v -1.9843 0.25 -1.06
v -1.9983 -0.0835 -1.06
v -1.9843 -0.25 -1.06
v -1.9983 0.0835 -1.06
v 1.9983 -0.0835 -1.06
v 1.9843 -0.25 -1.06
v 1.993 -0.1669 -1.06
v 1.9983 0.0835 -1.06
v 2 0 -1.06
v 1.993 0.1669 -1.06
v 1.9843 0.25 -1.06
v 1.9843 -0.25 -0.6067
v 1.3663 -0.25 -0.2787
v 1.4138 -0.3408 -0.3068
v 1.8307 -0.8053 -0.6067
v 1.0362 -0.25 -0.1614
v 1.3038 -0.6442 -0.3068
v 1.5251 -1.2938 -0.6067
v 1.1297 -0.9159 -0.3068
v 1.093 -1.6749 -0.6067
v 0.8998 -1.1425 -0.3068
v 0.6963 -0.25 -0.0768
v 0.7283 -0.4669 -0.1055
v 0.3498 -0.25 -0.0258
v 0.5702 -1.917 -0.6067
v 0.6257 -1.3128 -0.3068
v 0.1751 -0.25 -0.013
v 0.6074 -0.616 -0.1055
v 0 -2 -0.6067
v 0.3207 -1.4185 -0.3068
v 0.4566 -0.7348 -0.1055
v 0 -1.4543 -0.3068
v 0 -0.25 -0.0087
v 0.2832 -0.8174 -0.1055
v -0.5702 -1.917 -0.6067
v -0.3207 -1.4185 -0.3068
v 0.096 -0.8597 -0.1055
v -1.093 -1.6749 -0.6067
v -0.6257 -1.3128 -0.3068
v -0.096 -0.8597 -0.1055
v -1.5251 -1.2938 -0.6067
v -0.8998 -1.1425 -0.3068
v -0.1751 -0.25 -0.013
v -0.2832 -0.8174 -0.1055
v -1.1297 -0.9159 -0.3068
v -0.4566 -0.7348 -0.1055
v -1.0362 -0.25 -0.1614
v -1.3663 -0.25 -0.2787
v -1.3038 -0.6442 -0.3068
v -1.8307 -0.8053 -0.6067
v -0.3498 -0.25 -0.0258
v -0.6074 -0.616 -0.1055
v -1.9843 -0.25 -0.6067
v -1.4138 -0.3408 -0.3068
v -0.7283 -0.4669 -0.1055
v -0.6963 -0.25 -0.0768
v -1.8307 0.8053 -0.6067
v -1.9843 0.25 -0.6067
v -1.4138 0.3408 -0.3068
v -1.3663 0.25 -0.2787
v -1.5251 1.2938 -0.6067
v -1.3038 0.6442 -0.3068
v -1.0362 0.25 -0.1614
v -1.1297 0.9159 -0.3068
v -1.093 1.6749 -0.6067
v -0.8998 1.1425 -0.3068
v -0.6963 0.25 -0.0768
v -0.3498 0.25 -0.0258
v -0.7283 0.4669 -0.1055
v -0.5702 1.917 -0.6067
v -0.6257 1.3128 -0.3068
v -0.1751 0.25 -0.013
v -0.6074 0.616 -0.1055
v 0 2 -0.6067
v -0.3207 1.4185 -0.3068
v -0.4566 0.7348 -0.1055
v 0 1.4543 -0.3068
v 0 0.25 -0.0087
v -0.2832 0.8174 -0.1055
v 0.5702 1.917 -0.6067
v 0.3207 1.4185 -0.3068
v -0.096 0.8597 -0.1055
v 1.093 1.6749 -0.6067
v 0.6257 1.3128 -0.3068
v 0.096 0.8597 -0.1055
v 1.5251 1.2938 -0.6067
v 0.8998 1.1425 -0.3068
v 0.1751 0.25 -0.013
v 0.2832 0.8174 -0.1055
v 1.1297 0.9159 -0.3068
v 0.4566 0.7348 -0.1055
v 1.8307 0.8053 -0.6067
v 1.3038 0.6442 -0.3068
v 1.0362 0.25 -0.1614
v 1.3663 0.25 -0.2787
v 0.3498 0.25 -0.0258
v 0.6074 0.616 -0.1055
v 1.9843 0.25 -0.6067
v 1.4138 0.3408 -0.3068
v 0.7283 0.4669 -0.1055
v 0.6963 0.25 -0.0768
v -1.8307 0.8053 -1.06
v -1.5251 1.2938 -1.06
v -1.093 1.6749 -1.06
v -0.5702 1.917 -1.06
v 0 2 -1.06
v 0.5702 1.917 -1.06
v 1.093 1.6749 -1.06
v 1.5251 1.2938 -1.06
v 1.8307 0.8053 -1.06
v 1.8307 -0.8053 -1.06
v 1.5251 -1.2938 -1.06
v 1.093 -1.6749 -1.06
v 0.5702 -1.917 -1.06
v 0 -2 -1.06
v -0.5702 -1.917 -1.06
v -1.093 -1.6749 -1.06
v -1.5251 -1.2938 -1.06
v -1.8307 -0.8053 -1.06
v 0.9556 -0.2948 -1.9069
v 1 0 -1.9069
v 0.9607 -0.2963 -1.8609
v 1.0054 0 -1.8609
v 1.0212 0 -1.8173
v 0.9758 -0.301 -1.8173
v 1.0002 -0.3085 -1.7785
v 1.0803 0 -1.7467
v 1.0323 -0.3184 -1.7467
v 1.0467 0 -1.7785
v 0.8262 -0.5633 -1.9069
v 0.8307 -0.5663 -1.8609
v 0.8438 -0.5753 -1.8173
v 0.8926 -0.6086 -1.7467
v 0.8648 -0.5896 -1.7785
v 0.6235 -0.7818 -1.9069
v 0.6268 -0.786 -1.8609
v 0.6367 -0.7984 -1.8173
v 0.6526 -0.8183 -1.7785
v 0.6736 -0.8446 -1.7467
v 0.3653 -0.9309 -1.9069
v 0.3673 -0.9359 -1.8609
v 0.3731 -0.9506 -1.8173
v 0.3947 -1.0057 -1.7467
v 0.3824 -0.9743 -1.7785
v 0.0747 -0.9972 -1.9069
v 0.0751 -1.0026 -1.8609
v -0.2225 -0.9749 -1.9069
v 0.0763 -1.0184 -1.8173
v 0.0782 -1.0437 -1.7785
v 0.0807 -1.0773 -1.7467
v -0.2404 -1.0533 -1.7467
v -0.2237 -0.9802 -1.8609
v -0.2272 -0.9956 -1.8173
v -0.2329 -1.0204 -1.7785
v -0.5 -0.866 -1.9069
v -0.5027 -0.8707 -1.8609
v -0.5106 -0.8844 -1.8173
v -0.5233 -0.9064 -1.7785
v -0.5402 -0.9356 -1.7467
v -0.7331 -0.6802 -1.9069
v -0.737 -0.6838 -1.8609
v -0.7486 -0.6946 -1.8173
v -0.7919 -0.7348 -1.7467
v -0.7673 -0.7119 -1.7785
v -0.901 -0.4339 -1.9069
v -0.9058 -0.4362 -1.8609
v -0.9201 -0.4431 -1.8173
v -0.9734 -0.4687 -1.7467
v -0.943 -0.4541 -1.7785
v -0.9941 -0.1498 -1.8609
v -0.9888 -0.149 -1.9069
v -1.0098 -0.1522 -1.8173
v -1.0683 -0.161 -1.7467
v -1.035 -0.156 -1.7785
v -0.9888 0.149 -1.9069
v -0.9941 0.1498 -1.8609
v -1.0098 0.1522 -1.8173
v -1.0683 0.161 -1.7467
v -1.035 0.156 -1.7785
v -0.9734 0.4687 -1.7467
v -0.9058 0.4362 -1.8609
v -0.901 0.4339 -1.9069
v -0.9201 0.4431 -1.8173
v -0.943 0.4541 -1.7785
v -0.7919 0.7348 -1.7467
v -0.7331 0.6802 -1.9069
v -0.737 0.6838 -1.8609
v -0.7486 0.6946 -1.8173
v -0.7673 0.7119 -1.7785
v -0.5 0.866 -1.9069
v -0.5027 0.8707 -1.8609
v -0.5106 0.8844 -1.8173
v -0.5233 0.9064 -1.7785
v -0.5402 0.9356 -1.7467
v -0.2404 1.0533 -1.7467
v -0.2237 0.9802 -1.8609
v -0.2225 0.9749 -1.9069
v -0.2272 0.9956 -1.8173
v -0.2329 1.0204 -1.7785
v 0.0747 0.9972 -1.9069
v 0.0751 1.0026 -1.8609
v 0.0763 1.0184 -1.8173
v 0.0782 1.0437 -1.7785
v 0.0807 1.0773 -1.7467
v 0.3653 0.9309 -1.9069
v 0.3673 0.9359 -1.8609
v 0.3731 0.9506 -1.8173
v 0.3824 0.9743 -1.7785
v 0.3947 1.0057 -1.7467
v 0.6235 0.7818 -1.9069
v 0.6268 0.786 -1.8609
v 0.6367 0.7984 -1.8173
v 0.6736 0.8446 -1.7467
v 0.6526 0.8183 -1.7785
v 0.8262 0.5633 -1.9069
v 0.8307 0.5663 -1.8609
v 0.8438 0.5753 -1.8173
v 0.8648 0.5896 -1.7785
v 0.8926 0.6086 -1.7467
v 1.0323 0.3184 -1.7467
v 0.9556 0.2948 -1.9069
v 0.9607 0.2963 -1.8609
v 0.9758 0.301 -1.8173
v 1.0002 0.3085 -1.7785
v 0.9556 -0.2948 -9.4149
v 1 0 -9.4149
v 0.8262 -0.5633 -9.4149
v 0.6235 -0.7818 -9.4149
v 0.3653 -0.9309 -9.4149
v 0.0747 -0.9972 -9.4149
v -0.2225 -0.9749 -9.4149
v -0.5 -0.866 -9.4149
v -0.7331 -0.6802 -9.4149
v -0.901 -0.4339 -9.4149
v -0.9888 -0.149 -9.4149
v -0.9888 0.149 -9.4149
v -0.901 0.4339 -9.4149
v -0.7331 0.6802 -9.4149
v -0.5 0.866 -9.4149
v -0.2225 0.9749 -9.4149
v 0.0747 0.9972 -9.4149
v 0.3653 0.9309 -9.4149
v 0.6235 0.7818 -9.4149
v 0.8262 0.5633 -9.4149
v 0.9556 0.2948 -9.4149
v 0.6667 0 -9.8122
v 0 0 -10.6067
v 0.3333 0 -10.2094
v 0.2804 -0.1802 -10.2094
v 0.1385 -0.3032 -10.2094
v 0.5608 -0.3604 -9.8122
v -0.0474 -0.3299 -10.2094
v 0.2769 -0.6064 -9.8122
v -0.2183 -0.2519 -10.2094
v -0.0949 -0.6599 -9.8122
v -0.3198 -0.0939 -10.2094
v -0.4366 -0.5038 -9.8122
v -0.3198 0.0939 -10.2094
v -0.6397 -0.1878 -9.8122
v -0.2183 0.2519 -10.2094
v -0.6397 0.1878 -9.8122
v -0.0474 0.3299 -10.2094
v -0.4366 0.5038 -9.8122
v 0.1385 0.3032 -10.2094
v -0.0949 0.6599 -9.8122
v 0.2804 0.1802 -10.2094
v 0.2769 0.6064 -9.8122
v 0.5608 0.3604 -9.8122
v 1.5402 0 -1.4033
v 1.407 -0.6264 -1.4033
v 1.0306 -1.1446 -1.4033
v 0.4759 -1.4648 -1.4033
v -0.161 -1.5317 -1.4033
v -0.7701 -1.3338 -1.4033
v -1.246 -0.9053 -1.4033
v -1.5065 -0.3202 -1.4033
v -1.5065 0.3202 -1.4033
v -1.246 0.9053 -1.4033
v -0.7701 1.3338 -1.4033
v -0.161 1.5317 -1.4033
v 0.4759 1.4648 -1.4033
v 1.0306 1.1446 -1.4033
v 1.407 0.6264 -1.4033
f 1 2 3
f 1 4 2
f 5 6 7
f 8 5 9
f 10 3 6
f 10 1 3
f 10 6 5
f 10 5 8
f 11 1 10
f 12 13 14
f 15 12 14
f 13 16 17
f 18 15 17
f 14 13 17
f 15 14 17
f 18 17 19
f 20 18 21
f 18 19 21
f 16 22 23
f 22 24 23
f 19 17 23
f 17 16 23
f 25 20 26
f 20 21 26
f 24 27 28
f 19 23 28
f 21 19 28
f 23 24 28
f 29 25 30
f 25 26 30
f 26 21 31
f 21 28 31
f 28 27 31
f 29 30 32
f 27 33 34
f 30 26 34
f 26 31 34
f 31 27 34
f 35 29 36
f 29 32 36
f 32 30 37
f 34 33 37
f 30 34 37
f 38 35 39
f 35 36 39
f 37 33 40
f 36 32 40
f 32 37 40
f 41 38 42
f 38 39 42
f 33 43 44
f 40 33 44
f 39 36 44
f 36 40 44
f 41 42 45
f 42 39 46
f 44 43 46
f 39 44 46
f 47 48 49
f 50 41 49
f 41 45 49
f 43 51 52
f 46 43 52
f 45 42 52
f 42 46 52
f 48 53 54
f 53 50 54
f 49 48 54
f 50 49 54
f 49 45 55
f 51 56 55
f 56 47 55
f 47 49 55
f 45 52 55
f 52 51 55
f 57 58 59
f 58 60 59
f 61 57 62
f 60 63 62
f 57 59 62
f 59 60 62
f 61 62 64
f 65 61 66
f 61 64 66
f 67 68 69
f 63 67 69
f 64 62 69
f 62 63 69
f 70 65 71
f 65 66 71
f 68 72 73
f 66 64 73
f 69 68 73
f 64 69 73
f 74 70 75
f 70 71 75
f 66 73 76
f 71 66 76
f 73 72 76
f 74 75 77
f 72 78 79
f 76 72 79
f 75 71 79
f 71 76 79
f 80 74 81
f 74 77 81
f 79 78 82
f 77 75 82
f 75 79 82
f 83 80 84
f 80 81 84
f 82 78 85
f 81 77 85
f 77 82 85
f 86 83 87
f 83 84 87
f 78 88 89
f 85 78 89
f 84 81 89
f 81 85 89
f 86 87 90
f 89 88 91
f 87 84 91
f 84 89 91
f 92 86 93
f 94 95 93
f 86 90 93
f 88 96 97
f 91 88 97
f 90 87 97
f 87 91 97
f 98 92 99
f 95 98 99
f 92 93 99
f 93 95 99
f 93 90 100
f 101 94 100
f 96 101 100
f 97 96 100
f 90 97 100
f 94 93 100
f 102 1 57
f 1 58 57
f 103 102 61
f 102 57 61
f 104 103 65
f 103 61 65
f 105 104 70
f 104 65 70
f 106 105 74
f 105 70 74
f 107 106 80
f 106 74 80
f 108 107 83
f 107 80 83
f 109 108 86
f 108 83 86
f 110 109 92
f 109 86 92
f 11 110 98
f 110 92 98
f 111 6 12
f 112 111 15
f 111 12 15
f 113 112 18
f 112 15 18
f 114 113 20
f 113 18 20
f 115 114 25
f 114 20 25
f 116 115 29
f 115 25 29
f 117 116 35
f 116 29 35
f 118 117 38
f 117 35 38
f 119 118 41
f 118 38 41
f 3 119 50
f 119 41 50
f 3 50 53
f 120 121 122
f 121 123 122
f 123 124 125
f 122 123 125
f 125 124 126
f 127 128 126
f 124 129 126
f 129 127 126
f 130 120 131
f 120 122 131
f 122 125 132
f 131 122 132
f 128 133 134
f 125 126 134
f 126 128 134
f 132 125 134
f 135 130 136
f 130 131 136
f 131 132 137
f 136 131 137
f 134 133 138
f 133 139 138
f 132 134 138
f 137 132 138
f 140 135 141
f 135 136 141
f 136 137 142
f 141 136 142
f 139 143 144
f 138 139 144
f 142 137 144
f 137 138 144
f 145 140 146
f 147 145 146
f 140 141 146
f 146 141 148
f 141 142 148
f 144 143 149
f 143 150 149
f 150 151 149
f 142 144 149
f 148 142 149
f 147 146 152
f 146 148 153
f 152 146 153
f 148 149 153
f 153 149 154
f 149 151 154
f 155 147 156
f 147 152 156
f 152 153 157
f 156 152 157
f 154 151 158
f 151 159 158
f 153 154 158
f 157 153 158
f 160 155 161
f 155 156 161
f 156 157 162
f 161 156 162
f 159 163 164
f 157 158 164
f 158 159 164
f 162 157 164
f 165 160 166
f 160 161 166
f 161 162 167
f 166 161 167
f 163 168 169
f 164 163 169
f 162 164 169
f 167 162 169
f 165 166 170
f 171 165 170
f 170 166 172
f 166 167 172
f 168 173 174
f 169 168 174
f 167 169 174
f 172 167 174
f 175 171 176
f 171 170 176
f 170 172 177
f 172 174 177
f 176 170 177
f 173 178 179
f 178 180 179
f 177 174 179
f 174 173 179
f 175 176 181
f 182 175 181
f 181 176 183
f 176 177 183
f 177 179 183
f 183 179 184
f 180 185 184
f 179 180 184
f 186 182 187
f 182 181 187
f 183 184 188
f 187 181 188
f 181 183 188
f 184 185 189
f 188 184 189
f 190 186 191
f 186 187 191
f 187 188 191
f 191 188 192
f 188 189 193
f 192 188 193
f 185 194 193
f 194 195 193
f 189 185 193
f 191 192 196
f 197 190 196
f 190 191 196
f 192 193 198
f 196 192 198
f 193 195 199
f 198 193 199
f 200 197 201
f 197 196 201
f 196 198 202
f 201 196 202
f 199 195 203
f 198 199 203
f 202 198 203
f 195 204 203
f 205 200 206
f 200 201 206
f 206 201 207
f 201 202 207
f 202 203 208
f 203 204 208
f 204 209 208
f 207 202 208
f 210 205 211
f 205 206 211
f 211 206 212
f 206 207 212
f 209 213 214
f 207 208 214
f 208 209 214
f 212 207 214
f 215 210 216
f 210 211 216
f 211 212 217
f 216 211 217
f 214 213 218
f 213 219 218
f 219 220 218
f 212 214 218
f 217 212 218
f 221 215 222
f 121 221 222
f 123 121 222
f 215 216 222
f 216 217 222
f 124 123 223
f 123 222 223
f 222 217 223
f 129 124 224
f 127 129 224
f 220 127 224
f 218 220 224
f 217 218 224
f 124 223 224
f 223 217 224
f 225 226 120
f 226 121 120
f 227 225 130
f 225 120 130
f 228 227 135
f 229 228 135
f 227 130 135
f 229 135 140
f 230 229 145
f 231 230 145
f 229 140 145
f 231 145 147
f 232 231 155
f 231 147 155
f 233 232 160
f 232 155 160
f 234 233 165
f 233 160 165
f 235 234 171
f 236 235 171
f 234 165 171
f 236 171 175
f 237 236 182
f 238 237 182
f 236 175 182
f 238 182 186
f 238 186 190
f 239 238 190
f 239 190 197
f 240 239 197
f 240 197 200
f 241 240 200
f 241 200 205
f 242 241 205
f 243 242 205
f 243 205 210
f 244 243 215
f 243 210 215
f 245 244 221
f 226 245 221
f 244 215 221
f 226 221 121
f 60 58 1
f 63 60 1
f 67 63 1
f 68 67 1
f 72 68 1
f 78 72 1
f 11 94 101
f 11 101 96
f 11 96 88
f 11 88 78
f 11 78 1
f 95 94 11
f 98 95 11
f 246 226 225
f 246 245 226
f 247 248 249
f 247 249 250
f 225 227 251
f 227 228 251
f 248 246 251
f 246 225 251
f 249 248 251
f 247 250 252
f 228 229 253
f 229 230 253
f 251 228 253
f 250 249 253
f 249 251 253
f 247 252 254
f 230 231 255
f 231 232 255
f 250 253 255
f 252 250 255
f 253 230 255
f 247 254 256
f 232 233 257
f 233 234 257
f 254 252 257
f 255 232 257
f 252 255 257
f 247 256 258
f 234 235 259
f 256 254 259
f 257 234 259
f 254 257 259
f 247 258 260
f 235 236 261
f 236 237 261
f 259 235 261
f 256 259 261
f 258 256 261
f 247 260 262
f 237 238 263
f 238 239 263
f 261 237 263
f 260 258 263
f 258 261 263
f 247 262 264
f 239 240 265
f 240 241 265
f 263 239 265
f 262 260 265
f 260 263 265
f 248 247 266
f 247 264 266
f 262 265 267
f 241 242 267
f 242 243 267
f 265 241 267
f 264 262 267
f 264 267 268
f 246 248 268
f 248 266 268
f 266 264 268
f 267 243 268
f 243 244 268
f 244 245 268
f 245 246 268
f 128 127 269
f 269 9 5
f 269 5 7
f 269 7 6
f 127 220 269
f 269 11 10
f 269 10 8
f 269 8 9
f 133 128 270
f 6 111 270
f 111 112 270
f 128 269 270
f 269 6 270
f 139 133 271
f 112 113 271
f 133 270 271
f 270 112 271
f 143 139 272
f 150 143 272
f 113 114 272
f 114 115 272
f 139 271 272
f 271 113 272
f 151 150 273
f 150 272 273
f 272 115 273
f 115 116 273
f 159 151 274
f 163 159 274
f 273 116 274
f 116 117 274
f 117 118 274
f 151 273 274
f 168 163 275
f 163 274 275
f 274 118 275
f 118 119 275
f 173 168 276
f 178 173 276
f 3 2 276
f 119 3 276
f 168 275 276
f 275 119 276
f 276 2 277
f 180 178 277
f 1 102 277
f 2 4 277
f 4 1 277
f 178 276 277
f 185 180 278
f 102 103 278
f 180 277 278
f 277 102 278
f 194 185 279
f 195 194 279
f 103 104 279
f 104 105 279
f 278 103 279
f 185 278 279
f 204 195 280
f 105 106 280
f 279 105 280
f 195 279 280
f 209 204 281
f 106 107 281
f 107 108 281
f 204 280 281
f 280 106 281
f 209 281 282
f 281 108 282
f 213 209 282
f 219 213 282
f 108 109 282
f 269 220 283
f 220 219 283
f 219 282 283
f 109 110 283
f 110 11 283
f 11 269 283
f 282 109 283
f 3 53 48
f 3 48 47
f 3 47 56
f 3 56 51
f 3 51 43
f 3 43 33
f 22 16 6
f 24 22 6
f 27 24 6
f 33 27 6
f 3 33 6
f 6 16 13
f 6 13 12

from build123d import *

# Parameters (mm, degrees)
SKETCH_2_W          = 10
SKETCH_2_H          = 0.5
CUT_EXTRUDE_1_DEPTH = 1.06


with BuildPart() as part:
    # 草图1 → 旋转1 (revolve)
    with BuildSketch(Plane(origin=(0, 0, 0), x_dir=(0, 0, -1), z_dir=(1, 0, 0)), mode=Mode.PRIVATE) as revolve_1_sk:
        with BuildLine():
            Line((0, 0), (10.606674091, 0))
            Line((10.606674091, 0), (9.414920498, 1))
            Line((9.414920498, 1), (1.906940731, 1))
            ThreePointArc((1.906940731, 1), (1.817307372, 1.021210009), (1.746685257, 1.08034139))
            Line((1.746685257, 1.08034139), (1.06, 2))
            Line((1.06, 2), (0.606674091, 2))
            ThreePointArc((0.606674091, 2), (0.155005568, 1.044994432), (0, 0))
        make_face()
    revolve(revolve_1_sk.sketch.rotate(Axis((0, 0, 0), (0, 0, -1)), 90), axis=Axis((0, 0, 0), (0, 0, -1)))

    # 草图2 → 切除-拉伸1 (cut)
    with BuildSketch(Plane.XY):
        Rectangle(SKETCH_2_W, SKETCH_2_H)
    extrude(amount=-CUT_EXTRUDE_1_DEPTH, mode=Mode.SUBTRACT)


solid = part.part
